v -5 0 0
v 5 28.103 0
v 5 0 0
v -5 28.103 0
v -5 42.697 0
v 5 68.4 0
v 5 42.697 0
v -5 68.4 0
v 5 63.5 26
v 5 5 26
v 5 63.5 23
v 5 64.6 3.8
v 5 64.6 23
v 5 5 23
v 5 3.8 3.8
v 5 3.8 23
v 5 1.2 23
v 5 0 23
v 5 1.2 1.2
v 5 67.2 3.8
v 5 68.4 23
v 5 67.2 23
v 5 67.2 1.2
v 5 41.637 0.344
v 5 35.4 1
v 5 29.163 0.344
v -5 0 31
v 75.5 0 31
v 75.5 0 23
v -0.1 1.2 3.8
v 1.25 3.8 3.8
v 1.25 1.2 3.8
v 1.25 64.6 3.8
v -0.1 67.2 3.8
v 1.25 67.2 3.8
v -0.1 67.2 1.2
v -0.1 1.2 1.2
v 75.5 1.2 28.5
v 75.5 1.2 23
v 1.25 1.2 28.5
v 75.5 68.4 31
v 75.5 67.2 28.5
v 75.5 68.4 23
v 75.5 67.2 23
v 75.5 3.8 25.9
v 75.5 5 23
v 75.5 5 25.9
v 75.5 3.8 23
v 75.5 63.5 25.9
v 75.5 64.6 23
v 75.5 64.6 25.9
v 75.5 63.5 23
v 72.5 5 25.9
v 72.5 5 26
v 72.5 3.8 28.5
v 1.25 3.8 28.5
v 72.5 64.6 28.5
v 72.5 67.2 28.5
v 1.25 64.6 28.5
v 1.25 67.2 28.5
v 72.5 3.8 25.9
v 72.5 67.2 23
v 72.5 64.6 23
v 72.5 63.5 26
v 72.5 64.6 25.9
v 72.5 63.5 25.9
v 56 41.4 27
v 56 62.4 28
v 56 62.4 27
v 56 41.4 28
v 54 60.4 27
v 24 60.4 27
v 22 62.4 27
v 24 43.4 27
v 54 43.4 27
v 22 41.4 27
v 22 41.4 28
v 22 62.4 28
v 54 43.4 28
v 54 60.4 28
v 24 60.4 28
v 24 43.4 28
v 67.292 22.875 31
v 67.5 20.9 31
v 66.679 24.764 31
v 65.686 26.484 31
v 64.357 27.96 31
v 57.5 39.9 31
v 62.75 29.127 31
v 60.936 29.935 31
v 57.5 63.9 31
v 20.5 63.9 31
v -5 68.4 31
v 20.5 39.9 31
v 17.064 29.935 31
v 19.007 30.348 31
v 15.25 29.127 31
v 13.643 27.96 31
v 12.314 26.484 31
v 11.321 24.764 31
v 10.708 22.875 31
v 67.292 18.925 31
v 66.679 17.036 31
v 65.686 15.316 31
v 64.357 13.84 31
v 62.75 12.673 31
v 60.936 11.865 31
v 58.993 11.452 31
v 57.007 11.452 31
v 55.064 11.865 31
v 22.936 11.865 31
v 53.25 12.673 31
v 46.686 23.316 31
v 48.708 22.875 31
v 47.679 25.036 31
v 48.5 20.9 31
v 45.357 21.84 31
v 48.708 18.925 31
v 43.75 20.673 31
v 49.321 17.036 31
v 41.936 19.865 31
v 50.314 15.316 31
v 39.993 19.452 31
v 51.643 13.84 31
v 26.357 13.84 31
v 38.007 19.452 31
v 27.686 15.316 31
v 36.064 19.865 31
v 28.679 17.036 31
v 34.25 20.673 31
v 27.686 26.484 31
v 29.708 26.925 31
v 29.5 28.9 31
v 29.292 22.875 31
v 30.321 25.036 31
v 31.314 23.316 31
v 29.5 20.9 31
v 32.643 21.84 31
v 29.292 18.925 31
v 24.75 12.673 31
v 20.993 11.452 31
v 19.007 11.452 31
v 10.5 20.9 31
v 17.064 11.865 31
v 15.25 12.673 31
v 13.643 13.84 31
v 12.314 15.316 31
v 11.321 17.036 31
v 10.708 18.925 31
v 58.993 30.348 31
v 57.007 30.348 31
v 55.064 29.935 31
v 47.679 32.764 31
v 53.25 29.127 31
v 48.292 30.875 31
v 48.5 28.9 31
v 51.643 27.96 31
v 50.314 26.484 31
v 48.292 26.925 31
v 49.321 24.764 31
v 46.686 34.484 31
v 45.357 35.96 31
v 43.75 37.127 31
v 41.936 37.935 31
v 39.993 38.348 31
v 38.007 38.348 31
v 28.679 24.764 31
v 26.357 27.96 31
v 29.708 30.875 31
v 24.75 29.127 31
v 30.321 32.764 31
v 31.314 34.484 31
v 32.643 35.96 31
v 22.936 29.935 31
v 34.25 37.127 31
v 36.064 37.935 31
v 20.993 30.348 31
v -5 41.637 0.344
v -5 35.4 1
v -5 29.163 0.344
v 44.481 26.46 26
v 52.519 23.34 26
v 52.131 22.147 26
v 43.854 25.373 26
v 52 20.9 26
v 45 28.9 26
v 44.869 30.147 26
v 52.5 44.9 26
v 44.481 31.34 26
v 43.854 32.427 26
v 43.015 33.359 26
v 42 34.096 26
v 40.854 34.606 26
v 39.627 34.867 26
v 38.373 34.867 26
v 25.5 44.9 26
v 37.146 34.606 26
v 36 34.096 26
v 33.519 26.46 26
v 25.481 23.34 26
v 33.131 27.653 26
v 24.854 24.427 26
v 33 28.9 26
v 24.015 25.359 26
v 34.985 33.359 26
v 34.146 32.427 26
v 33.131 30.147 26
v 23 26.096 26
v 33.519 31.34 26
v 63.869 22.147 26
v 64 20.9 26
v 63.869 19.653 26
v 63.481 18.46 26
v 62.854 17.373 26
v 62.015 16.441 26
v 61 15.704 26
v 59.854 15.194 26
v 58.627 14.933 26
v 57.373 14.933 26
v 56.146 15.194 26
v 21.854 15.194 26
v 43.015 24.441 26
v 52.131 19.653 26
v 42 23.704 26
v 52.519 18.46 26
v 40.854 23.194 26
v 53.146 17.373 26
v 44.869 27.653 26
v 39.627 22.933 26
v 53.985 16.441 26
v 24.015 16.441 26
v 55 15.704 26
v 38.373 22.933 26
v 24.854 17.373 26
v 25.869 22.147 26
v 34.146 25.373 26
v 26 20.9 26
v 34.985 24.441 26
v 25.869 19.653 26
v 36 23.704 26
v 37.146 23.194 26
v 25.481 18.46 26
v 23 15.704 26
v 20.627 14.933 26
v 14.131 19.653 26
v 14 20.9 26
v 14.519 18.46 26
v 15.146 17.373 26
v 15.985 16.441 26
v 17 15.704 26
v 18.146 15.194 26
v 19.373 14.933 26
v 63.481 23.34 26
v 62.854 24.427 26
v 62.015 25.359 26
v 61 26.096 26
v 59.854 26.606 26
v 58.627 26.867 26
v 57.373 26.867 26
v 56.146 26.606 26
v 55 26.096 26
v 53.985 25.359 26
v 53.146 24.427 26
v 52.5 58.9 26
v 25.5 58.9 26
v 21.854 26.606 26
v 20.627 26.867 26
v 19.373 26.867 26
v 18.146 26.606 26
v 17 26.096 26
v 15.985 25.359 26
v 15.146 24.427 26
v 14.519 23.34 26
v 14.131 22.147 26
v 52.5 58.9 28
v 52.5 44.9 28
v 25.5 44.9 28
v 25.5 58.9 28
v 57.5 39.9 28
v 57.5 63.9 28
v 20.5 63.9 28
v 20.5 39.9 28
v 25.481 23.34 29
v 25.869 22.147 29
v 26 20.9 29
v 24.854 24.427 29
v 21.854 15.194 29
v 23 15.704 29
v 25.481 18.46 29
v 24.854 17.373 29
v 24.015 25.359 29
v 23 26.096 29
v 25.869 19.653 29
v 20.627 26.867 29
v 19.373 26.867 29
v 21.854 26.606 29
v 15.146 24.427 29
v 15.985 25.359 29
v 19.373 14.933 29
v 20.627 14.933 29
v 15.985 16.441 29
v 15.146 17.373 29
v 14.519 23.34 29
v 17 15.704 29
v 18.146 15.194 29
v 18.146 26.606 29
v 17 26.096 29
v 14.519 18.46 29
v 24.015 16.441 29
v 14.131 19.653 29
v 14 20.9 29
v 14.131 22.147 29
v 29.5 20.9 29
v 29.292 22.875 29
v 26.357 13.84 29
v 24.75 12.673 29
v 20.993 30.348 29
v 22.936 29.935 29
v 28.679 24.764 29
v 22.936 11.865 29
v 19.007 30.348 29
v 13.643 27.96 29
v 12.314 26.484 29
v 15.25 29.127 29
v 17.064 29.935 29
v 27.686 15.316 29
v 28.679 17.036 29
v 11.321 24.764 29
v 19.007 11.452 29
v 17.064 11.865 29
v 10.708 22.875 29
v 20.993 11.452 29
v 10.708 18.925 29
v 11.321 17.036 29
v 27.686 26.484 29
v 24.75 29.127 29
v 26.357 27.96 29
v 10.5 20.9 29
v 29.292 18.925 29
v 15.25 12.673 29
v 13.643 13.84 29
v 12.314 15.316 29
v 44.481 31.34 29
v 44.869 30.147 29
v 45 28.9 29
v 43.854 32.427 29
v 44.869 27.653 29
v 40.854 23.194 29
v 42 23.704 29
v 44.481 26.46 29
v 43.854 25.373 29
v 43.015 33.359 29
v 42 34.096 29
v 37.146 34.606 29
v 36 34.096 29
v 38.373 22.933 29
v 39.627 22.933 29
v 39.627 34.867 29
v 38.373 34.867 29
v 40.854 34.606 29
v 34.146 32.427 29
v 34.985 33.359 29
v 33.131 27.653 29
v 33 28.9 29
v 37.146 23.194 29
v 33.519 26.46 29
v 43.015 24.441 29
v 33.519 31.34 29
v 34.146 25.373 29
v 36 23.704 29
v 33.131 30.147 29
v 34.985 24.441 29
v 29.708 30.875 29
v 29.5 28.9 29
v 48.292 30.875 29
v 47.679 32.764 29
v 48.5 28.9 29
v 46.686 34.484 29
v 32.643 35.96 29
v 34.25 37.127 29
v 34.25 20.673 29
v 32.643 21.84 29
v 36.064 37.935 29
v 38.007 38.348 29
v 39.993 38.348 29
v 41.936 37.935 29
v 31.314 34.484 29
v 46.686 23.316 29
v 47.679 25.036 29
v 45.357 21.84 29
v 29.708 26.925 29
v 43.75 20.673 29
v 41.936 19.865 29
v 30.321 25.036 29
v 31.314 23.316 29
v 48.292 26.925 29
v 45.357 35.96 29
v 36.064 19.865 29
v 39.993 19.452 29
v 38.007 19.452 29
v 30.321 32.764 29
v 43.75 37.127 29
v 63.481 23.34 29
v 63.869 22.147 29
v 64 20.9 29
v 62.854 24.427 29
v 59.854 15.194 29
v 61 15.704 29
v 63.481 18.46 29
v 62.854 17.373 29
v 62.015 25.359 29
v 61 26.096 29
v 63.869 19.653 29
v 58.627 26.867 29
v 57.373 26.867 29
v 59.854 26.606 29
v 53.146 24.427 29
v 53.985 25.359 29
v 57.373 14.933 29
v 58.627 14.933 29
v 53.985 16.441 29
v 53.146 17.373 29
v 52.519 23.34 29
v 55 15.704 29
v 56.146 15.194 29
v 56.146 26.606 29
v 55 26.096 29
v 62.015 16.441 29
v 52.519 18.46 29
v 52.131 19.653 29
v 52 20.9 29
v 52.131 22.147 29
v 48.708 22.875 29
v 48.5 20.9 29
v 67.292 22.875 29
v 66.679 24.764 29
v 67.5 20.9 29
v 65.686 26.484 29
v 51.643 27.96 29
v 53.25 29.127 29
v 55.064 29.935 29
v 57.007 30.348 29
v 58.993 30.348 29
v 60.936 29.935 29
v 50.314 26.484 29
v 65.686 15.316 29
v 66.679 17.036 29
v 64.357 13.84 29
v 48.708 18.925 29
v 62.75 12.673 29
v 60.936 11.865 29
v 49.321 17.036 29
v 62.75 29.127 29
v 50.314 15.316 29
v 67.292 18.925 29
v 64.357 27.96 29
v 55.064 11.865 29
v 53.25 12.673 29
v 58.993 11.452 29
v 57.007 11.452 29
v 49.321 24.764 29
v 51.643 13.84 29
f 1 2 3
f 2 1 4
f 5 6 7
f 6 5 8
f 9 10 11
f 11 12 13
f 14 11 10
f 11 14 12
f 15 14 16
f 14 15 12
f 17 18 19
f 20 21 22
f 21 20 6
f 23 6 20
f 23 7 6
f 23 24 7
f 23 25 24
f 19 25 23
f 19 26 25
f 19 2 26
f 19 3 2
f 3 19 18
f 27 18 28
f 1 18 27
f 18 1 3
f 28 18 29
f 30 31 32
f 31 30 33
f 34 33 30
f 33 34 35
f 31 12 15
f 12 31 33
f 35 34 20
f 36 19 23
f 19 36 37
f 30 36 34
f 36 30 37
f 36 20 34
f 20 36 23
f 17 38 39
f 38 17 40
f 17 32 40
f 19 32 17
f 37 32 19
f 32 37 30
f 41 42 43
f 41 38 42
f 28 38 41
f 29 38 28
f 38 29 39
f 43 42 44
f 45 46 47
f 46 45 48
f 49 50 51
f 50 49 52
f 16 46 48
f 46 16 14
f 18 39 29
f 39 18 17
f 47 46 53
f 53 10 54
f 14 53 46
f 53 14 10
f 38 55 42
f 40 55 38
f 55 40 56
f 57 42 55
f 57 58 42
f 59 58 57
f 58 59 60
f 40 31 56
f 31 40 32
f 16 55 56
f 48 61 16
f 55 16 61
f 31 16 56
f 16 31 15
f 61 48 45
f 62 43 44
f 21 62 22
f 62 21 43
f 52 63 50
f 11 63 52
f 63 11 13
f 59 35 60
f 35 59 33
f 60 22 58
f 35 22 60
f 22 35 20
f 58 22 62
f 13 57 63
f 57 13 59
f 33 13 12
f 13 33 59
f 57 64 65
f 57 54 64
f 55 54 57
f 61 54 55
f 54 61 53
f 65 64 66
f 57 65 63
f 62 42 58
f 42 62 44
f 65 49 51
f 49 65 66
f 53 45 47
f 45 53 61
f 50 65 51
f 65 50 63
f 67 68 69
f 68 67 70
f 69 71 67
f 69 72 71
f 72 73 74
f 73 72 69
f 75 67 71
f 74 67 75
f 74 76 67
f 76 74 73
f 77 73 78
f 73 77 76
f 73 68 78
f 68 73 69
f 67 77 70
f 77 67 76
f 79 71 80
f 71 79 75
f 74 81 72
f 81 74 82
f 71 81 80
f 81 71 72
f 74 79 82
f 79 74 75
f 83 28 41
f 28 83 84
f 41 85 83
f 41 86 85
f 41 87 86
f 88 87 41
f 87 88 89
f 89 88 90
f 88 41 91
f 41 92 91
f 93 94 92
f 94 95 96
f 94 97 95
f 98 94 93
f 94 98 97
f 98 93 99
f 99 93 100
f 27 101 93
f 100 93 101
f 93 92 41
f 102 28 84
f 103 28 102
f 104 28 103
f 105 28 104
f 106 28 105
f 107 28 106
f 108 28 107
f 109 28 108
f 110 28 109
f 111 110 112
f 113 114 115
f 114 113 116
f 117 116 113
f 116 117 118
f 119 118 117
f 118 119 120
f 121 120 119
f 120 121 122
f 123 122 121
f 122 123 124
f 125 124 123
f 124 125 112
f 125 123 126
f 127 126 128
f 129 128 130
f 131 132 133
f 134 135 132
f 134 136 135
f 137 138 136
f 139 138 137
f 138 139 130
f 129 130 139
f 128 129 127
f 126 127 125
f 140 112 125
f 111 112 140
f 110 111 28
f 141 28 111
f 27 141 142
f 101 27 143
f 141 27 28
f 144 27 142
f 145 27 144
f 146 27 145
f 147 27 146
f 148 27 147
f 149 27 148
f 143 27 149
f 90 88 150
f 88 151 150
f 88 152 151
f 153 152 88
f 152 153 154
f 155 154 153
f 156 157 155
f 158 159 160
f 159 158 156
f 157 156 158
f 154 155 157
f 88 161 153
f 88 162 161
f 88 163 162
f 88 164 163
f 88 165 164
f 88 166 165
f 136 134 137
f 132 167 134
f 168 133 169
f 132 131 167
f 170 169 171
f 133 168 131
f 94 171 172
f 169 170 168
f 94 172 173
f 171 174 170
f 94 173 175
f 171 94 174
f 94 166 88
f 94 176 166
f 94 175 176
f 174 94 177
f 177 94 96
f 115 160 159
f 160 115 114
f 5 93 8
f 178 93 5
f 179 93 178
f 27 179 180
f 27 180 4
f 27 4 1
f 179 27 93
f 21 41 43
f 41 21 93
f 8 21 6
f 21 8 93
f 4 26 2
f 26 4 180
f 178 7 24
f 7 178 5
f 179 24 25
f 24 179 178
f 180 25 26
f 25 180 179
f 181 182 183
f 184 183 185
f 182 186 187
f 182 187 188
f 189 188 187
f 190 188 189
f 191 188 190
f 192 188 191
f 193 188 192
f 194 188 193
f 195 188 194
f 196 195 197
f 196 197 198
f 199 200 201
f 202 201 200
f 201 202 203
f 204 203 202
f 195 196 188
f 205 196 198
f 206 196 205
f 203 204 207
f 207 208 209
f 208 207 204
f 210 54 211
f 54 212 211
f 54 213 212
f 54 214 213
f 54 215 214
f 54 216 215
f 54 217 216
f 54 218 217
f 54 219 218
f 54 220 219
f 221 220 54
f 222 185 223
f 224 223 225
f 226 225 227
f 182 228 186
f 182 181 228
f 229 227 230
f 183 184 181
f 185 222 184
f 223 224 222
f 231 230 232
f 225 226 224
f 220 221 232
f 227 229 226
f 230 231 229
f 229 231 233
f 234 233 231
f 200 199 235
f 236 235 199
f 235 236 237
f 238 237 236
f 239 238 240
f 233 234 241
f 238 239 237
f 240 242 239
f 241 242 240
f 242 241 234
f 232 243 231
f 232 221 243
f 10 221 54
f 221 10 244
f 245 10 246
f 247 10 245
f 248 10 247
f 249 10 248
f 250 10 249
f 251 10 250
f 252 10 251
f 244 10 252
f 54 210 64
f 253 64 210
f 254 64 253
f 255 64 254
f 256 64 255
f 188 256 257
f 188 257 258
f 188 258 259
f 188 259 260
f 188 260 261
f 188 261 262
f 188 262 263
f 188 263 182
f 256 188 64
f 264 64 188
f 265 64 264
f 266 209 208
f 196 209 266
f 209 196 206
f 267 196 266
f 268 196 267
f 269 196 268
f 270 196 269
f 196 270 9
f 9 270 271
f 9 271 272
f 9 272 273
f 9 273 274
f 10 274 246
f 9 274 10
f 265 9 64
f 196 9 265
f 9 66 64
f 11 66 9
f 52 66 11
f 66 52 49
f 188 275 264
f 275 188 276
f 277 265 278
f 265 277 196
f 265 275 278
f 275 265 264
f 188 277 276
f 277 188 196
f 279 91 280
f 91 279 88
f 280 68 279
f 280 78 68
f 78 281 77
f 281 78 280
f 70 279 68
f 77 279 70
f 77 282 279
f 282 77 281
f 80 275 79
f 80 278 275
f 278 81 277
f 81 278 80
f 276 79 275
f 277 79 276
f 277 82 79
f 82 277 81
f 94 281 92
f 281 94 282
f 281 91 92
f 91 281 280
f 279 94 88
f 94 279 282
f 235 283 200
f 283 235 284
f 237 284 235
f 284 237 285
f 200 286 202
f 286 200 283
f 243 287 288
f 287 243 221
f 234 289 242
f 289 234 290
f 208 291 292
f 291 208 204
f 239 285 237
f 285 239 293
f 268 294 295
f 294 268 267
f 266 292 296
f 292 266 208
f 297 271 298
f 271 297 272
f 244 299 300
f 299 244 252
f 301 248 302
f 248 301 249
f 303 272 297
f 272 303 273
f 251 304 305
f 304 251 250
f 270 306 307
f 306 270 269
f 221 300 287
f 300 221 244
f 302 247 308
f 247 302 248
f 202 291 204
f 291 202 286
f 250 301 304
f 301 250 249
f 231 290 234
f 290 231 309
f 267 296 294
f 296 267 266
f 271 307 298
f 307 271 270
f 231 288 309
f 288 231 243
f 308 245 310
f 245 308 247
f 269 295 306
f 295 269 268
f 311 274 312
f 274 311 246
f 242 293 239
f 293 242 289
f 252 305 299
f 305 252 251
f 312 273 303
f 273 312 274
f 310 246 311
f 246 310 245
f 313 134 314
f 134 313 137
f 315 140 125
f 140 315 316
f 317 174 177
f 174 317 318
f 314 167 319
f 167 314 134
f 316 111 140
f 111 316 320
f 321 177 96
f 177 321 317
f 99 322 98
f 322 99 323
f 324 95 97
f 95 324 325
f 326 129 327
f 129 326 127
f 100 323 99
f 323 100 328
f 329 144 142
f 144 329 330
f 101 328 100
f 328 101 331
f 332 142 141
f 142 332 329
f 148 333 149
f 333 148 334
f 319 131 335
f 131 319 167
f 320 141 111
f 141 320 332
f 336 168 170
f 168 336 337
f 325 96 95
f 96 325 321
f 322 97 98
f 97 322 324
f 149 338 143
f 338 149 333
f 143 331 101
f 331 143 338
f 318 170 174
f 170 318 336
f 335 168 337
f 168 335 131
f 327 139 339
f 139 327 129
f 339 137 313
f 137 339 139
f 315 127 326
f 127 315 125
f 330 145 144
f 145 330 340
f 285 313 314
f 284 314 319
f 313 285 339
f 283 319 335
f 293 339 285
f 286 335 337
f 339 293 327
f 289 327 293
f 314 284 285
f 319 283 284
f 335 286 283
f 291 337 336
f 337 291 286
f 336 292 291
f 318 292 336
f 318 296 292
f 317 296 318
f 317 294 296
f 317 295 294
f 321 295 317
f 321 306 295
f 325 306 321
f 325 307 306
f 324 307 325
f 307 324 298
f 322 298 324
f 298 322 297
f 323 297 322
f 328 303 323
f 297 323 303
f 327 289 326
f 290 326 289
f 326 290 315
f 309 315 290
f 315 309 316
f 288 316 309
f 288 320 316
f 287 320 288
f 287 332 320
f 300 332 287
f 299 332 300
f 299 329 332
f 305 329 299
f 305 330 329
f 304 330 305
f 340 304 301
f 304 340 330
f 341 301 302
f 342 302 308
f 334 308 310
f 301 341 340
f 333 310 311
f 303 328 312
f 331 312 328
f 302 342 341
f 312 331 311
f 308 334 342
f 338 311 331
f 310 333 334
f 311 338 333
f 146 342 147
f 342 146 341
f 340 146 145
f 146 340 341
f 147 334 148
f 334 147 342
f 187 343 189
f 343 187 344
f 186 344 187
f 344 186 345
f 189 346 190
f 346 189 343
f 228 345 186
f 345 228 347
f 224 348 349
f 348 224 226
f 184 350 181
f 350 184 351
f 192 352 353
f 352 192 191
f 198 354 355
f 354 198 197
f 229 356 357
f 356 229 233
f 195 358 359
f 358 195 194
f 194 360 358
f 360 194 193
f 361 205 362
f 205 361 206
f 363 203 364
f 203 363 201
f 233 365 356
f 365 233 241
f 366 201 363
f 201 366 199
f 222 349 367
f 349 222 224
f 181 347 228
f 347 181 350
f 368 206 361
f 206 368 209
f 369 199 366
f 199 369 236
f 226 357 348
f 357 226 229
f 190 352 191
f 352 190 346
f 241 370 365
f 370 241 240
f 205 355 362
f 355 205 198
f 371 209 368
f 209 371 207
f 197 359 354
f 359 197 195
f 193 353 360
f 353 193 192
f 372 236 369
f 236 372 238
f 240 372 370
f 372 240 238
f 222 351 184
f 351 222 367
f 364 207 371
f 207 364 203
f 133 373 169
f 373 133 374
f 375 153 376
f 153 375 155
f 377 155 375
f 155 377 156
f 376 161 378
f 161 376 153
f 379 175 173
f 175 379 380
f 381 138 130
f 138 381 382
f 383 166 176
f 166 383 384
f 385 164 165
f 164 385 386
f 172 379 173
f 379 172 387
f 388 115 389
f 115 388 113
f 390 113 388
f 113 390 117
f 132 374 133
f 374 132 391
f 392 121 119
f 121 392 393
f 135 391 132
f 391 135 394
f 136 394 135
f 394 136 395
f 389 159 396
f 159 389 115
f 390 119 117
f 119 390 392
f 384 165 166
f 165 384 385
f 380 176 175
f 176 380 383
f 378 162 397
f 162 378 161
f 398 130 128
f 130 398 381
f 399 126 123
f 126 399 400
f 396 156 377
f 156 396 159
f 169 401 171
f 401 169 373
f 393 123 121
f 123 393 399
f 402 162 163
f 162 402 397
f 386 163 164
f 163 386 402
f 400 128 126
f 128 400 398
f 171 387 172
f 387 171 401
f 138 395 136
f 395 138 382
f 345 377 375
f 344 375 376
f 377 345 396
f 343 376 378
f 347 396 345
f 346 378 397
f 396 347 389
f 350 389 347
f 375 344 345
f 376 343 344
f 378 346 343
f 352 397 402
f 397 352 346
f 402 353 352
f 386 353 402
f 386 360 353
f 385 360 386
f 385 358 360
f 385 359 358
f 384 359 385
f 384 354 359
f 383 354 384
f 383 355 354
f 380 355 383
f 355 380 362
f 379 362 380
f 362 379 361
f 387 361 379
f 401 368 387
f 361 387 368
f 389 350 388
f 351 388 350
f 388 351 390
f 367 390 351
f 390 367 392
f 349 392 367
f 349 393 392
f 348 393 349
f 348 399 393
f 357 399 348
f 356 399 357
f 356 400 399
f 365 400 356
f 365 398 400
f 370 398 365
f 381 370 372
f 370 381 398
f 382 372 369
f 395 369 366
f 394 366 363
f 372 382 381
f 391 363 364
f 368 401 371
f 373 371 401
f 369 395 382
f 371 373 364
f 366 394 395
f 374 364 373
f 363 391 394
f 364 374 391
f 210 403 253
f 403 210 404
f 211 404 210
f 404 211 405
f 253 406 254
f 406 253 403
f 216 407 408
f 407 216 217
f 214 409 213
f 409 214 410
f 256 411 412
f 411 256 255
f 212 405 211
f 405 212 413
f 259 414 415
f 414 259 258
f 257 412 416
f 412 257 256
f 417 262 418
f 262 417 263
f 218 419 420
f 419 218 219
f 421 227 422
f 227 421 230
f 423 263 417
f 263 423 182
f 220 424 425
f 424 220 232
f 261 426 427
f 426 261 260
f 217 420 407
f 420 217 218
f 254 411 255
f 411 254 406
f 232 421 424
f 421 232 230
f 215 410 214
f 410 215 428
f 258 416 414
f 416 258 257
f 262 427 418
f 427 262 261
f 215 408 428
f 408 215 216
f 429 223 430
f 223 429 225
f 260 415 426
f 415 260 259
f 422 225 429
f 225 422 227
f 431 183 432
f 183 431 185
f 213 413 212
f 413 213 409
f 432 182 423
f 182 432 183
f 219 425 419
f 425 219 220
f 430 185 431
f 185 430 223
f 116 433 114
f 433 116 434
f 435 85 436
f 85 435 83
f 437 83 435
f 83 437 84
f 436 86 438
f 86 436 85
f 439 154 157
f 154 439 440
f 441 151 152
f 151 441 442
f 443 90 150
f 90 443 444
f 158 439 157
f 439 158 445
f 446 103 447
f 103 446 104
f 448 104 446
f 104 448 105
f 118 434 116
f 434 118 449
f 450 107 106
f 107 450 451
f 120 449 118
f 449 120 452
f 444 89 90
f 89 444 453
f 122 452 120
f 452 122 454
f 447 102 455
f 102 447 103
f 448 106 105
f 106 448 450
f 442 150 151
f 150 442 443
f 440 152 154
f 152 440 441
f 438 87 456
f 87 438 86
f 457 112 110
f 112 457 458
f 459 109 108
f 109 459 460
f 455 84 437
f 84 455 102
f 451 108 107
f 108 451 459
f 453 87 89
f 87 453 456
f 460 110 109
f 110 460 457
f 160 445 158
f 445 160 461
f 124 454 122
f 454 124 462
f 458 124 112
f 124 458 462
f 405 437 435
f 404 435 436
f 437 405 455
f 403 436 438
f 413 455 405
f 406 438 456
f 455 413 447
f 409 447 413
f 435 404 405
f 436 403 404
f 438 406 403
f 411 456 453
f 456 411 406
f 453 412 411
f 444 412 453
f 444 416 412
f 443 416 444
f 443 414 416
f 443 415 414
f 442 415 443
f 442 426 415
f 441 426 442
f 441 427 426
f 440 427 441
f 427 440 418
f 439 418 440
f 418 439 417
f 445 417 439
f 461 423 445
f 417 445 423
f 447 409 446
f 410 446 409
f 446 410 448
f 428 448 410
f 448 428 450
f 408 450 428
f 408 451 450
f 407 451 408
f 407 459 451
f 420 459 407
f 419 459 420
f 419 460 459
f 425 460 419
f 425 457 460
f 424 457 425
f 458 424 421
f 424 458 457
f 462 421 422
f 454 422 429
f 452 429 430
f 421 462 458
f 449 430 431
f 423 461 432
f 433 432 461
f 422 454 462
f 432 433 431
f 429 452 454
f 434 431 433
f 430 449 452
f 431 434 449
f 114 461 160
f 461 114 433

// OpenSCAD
/*
* disable
! show only
# highlight / debug
% transparent / background 
*/

$fs=0.8;
// Dimensions communes à l'ensemble des boitiers 
//--------- epaisseur du boitier
E=5;
// --------------- epaisseur de l'epoxy
hauteurEpoxy=2;
largeurRainureEpoxy=1.2;
hauteurRainureEpoxy=hauteurEpoxy;

//--------------- hauteur et largeur rainure humidite male
hauteurRainureHumidite=3;
largeurRainureHumidite=2;

// --------------------------passe fil
//rayon petit et gros fils
rayonPetitFil=2.5;
rayonGrosFil=4;
rayonVis=1.6;
// distance trous/bord pour le passe-fils
dTrouBord=2;
//Epaisseur tete vis passe-fils
epaisseurTeteVis=3;
// ------------------------ tube vélo
diametreTube=60;
epaisseurEncoche=E/5;
// taille d'un ecrou M3  : 6.2 x 3.5 (avec un jeu)// a voir 
diametreEcrou=6.2;
epaisseurEcrou=3.5;
// ------------------------ bouton étanches
diametreBoutonEtanche=18;
diametreTrouBoutonEtanche=12;
//--------------------------ecran
longueurEcran=27;
largeurEcran=14;
//distance de la gauche de la carte carte à la gacuhe de l' ecran 
distanceBordX=20.5;
//distance du haut de la carte au haut de l'éecran
distanceBordY=4.5;


////// ------ Dimension pour la carte guidon :
// largeur de la carte electronique
largeurCarte=60+0.8;
//longueur de la carte électronique
L=70+0.5;
//
longueurCarte=L;
//hauteur de la carte electronique
hauteurSurCarte=14;
//hauteur sous la carte electronique
hauteurSousCarte=2;

// pensez à mettre hauteurPasseFil=0 ci-dessous




////// ------ Dimension pour carte puissance 
// largeur de la carte electronique
//largeurCarte=46.2;
//longueur de la carte électronique
//L=81.6;
//longueurCarte=L;
//hauteur de la carte electronique
//hauteurSurCarte=20;
//hauteur sous la carte electronique
// 19 + E
//hauteurSousCarte=19+1;
// pensez à mettre hauteurPasseFil ci-dessous



// Dimensions imposées -------------------------------
//hauteur au dessus de  la carte
HHAUT=epaisseurTeteVis+3*dTrouBord+2*rayonGrosFil+epaisseurEcrou;

largeurInterieure=largeurCarte-2*largeurRainureEpoxy;
//longueur passe fil

longueurPasseFil=hauteurRainureHumidite+diametreEcrou;

//hauteurPasseFil=0 pour la carte guidon
//hauteurPasseFil=epaisseurTeteVis+2*dTrouBord+2*rayonGrosFil+epaisseurEcrou;
hauteurPasseFil=dTrouBord/2;
    
largeurPasseFil=largeurInterieure-2; // On retire 2 mm pour permettre au couvercle de coulisser sans problème.


hauteurTotale=hauteurSurCarte+hauteurSousCarte+hauteurPasseFil+2*E+hauteurEpoxy+2;
hauteurLaterale=hauteurSousCarte+E+hauteurEpoxy+hauteurSurCarte;




// ---------------------------------------------------------------
// Trou pour le passage des câbles boitier puissance
function positionTrouY(i)=dTrouBord+diametreEcrou/2+ (0.8*dTrouBord+diametreEcrou)*i;

function positionGrosTrouY()=largeurPasseFil-dTrouBord-rayonGrosFil; 




// ---------------------------------------------------------------
// ---------------------------------------------------------------

module haricot(largeur,hauteur,epaisseur){
    linear_extrude(height=epaisseur)
    union(){
        circle(d=largeur);
        translate([0,hauteur-largeur])circle(d=largeur);
        translate([-largeur/2,-largeur/2])square(largeur/2);
        translate([-largeur/2,0])square([largeur,hauteur-largeur]);
        }
}
// ---------------------------------------------------------------

module attache(){
    translate([4,4,0])difference(){
        haricot(8,12,2.5);
        haricot(2,6,2.5);
        translate([-5,-4,0])cube([3,12,2.5]);
    }
    
}




// ---------------------------------------------------------------

module trouPasseFilGuidon(){
    
    longueurPasseFil=3*dTrouBord+2*rayonPetitFil+epaisseurEcrou;
    largeurPasseFil=2*dTrouBord+diametreEcrou;
    hauteurPasseFil=2*dTrouBord+diametreEcrou;
    difference(){
        cube([longueurPasseFil,largeurPasseFil,hauteurPasseFil]);
    
        //troufil
        hauteurTrou=hauteurPasseFil;
        
        translate([dTrouBord+rayonPetitFil,largeurPasseFil/2,hauteurTrou/2])cylinder(r=rayonPetitFil,h=hauteurPasseFil+2,center=true);
        
        //trouVis
        tailleTrouVis=2*dTrouBord+epaisseurEcrou;
        translate([2*dTrouBord+2*rayonPetitFil+epaisseurEcrou/2,largeurPasseFil/2,hauteurPasseFil/2])rotate([0,90,0])cylinder(r=rayonVis,h=tailleTrouVis+2,center=true);
        
        //trouEcrou
        largeurTrouEcrou=dTrouBord+diametreEcrou;
        translationXTrou=2*dTrouBord+2*rayonPetitFil+epaisseurEcrou/2;
        translationYTrou=dTrouBord/2+diametreEcrou/2;
        translationZTrou=dTrouBord+diametreEcrou/2;
        
        translate([translationXTrou,translationYTrou,translationZTrou])cube([epaisseurEcrou,largeurTrouEcrou+1,diametreEcrou],center=true);
        
    } 
    
}


module trouBoitierPasseFil(){
    
    //Moyen trous
    translate([longueurPasseFil,positionTrouY(0),dTrouBord+rayonPetitFil+2.5])rotate([0,90,0])cylinder(r=rayonPetitFil+1,h=longueurPasseFil+20,center=true);
    // Petit trous
    for (i=[1:3])  translate([longueurPasseFil,positionTrouY(i),dTrouBord+rayonPetitFil])rotate([0,90,0])cylinder(r=rayonPetitFil,h=longueurPasseFil+20,center=true);
    
    // gros trous
    translate([longueurPasseFil,positionGrosTrouY(),rayonGrosFil+dTrouBord])rotate([0,90,0])cylinder(r=rayonGrosFil,h=longueurPasseFil+20,center=true);    
}


module passeFils(){
difference(){
    //3 mm pour la tete de la vis    
    cube([longueurPasseFil,largeurPasseFil,hauteurPasseFil]);
        
    //petits trous fils   
    
      // passage vis
    for (i=[0:3]){  
      translate([diametreEcrou/2,positionTrouY(i),hauteurPasseFil-epaisseurEcrou])cylinder(r=rayonVis,h=longueurPasseFil+10,center=true);    
    }
    //gros trous fils
    
    translate([diametreEcrou/2,positionGrosTrouY(),hauteurPasseFil-epaisseurEcrou-10])cylinder(r=rayonVis,h=2*longueurPasseFil);
    //trous ecrous petits fils
    for (i=[0:3]){
    // taille d'un ecrou M3 6.2 x 3.5 (avec un jeu)// a voir    
    translate([diametreEcrou/2,positionTrouY(i),hauteurPasseFil-dTrouBord-epaisseurEcrou/2])cube([6.2,6.2,3.5],center=true);  
       }
    //trous écran gros fils
    translate([diametreEcrou/2,positionGrosTrouY(),hauteurPasseFil-dTrouBord-epaisseurEcrou/2])cube([6.2,6.2,3.5],center=true);
    trouBoitierPasseFil();
    }
   
}

// ---------------------------------------------------------------
// module pieceA()
//cote=0 rainure epoxy à gauche cote=1 rainure epoxy a gauche
module pieceA(cote,tol){
    longueurRainurePieceA=longueurCarte+hauteurRainureHumidite*1.5;
    hauteurRainurePieceA=hauteurLaterale+hauteurRainureHumidite;
    largeurRainurehumiditePieceA=largeurRainureHumidite-tol;
    hauteurRainurehumiditePieceA=hauteurRainureHumidite-tol;
    union(){
        difference(){
            cube([longueurCarte,E,hauteurLaterale]);
            if (cote==0)translate([0,E-largeurRainureEpoxy,hauteurSousCarte+E])cube([longueurCarte,largeurRainureEpoxy,hauteurRainureEpoxy]);
            
            if (cote==1)translate([0,0,hauteurSousCarte+E])cube([longueurCarte,largeurRainureEpoxy,hauteurRainureEpoxy]);
            }
            
        translate([-hauteurRainureHumidite/2+longueurCarte/2,E/2,E/2+hauteurRainurePieceA/2]) cube([longueurRainurePieceA,largeurRainurehumiditePieceA,hauteurRainurePieceA],center=true);
        }
}

module pieceB(tol){
       largeurRainureHumiditePieceB=largeurRainureHumidite-tol;
    //EDITJMR : Je ne comprends ce facteur 1.5
       hauteurRainureHumiditePieceB=1.5*hauteurRainureHumidite-tol;
       largeurPieceB=largeurInterieure+2*E;
       largeurRainurePieceB=largeurInterieure+E+largeurRainureHumiditePieceB;
   union (){
       
       cube([longueurCarte+E,largeurPieceB,E]);
       
       translate([-hauteurRainureHumiditePieceB/2,(largeurPieceB)/2,E/2]) cube([hauteurRainureHumiditePieceB,largeurRainurePieceB,largeurRainureHumiditePieceB],center=true);
       } 
}







//dessine=1, on dessine le passefil ; 0 rien

module pieceC(dessine,tol){
    largeurRainurehumiditePieceC=largeurRainureHumidite-tol;
    hauteurRainurehumiditePieceC=hauteurRainureHumidite-tol;
    largeurPieceC=largeurInterieure+2*E;
    largeurRainurePieceC=largeurPieceC-E+largeurRainurehumiditePieceC;
    difference(){
        union(){
            cube([E,largeurPieceC,hauteurTotale]);
            //rainure
            difference(){
                  translate([-hauteurRainureHumidite,E/2-largeurRainurehumiditePieceC/2,0])cube([hauteurRainureHumidite,largeurRainurePieceC,hauteurTotale-E/2]);
                  #translate([-hauteurRainureHumidite,E/2+largeurRainurehumiditePieceC/2,0])cube([hauteurRainureHumidite,largeurRainurePieceC-2*largeurRainurehumiditePieceC,hauteurTotale-E/2-largeurRainurehumiditePieceC]);
            }
        //passeFil    
        if (dessine==1)translate([-longueurPasseFil,largeurInterieure/2+E-largeurPasseFil/2,hauteurLaterale])passeFils();
        }
        //trouPAsseFil
        if (dessine==1)translate([-longueurPasseFil,largeurInterieure/2+E-largeurPasseFil/2,hauteurLaterale])trouBoitierPasseFil();
    }    
    
}    


// si passeFils=1, on ajoute le passe-fils - inutile pour le couvercle.
module coque(passeFils){
    union(){
             //fond
             cube([L+E,largeurInterieur+2*E,E]);
             //cote gauche avec passe fil
             translate([L+E,0,0])rotate([0,-90,0])cube([hauteurTotale,largeurInterieur+2*E,E]);
             //cote lateral 1
             translate([0,E,0])rotate([90,0,0])cube([L+E,hauteurLaterale,E]);
             //cote lateral 2
             translate([0,largeurCarte+2*E,0])rotate([90,0,0])cube([L+E,hauteurLaterale,E]);
             if (passeFils==1)translate([L-longueurPasseFil,E,hauteurLaterale]) passeFils();
         }
}

// ---------------------------------------------------------------

module boitierPuissance(){

difference(){
    union(){
        pieceB(tol=0);
        pieceA(0,tol=0);
        translate([0,largeurInterieure+E,0])pieceA(1,tol=0);
       
        translate([longueurCarte,0,0])pieceC(1,tol=0);
        // attache
        translate([12,2,2.5])rotate([180,0,-90])attache();
        translate([L,2,2.5])rotate([180,0,-90])attache();
    //
        translate([L,largeurCarte+2*E-5,2.5])rotate([180,0,-90])mirror([12,0,0])attache();
        translate([12,largeurCarte+2*E-5,2.5])rotate([180,0,-90])mirror([12,0,0])attache();
        }
   //tube du vélo : prends 2 mm du boitier.      
   translate([-E,(largeurCarte+2*E)/2,-diametreTube/2+epaisseurEncoche])rotate([0,90,0])cylinder(h=L+2*E,d=diametreTube); 
    }    
}
// ---------------------------------------------------------------

module couverclePuissance(){
    tolerance=-0.6;
    difference(){
        translate([-E,0,0])cube([L+2*E,largeurInterieure+2*E,hauteurTotale]);
        translate([E,0,0])union(){  
                 pieceB(tol=tolerance);
                 // 2 = pas de rainure
                 pieceA(2,tolerance);
                 translate([0,largeurInterieure+E,0])pieceA(2,tolerance);
       
                 translate([longueurCarte,0,0])pieceC(0,tolerance);
            
                } 
       //tube du vélo : prends 2 mm du boitier.      
       translate([-E,(largeurCarte+2*E)/2,-diametreTube/2+epaisseurEncoche])rotate([0,90,0])cylinder(h=L+2*E,d=diametreTube);
       // cubeinterieure         
       translate([E,E,0])cube([L,largeurInterieure*1.001,hauteurTotale-E]);
    }
}    

// --------------
module boitierGuidon(){
tailleConnecteur4point=16;
translateXfil=longueurCarte+E-(rayonPetitFil+2*dTrouBord+epaisseurEcrou);
translateYfil=E+rayonPetitFil+tailleConnecteur4point/2;

difference(){
    union(){
        pieceB(tol=0);
        pieceA(0,tol=0);
        translate([0,largeurInterieure+E,0])pieceA(1,tol=0);
       
        translate([longueurCarte,0,0])pieceC(0,tol=0);
        // attache
        translate([12,2,2.5])rotate([180,0,-90])attache();
        translate([L,2,2.5])rotate([180,0,-90])attache();
    //
        translate([L,largeurCarte+2*E-5,2.5])rotate([180,0,-90])mirror([12,0,0])attache();
        translate([12,largeurCarte+2*E-5,2.5])rotate([180,0,-90])mirror([12,0,0])attache();
        
        // passefil et fil  du 
        
        
        translateXPasseFil=translateXfil-dTrouBord-rayonPetitFil;
        translateYPasseFil=translateYfil-dTrouBord-rayonPetitFil;
        translateZPasseFil=-2*dTrouBord-diametreEcrou;
        translate([translateXPasseFil,translateYPasseFil,translateZPasseFil])trouPasseFilGuidon();
        
        }
   //tube du vélo : prends 2 mm du boitier.      
   translate([-E-(3*dTrouBord+2*rayonPetitFil+epaisseurEcrou+1),(largeurCarte+2*E)/2,-diametreTube/2+epaisseurEncoche])rotate([0,90,0])cylinder(h=L+2*E,d=diametreTube);
   // Trous pour le passage des fils
    
   translate([translateXfil,translateYfil,0])cylinder(r=rayonPetitFil,h=E+20,center=true);
         
   //      
    }    
}
// ---------------------------------------------------------------

module couvercleGuidon(){
    tolerance=-0.6;
    difference(){
        translate([-E,0,0])cube([L+2*E,largeurInterieure+2*E,hauteurTotale]);
        translate([E,0,0])union(){  
                 pieceB(tol=tolerance);
                 // 2 = pas de rainure
                 pieceA(2,tolerance);
                 translate([0,largeurInterieure+E,0])pieceA(2,tolerance);
       
                 translate([longueurCarte,0,0])pieceC(0,tolerance);
            
                } 
       //tube du vélo : prends 2 mm du boitier.      
       translate([-E,(largeurCarte+2*E)/2,-diametreTube/2+epaisseurEncoche])rotate([0,90,0])cylinder(h=L+2*E,d=diametreTube);
       // cubeinterieure         
       translate([E,E,0])cube([L,largeurInterieure+0.1,hauteurTotale-E]);
    
       
                
       // trou pour la fenetre 
       centreTrouX=E+longueurEcran/2+distanceBordX;
       centreTrouY=largeurInterieure+E-largeurEcran/2-distanceBordY;   
      
               
               
               
                
       translate([centreTrouX,centreTrouY,hauteurTotale])cube([longueurEcran,largeurEcran,10],center=true);
       translate([centreTrouX,centreTrouY,hauteurTotale])cube([longueurEcran+10,largeurEcran+10,6],center=true);
         
       // trous pour les boutons
       bouton1X=centreTrouX-diametreBoutonEtanche/2-10;
       bouton1Y=centreTrouY-(largeurEcran+10)/2-diametreBoutonEtanche/2-10;    
       
       
       bouton2X=centreTrouX;
       bouton2Y=centreTrouY-(largeurEcran+10)/2-diametreBoutonEtanche/2-2;       
       
       bouton3X=centreTrouX+diametreBoutonEtanche/2+10;
       bouton3Y=centreTrouY-(largeurEcran+10)/2-diametreBoutonEtanche/2-10; 
       
       translate([bouton1X,bouton1Y,hauteurTotale])cylinder(d=diametreTrouBoutonEtanche,h=10,center=true);
       translate([bouton1X,bouton1Y,hauteurTotale+3])cylinder(d=diametreBoutonEtanche+1,h=10,center=true);
       
       translate([bouton2X,bouton2Y,hauteurTotale])cylinder(d=diametreTrouBoutonEtanche,h=10,center=true);    
       translate([bouton2X,bouton2Y,hauteurTotale+3])cylinder(d=diametreBoutonEtanche+1,h=10,center=true);  
       translate([bouton3X,bouton3Y,hauteurTotale])cylinder(d=diametreTrouBoutonEtanche,h=10,center=true);       
       translate([bouton3X,bouton3Y,hauteurTotale+3])cylinder(d=diametreBoutonEtanche+1,h=10,center=true);       
           
       // joint pour l'écran
       difference(){
           translate([centreTrouX,centreTrouY,hauteurTotale])cube([longueurEcran+7,largeurEcran+7,8],center=true);
           translate([centreTrouX,centreTrouY,hauteurTotale])cube([longueurEcran+3,largeurEcran+3,8],center=true);
       
        }
        
   }  
    
}    



couvercleGuidon();
//boitierGuidon();
//boitierPuissance();
//couverclePuissance();
//pieceA(0,0);
//pieceC(0,0);
